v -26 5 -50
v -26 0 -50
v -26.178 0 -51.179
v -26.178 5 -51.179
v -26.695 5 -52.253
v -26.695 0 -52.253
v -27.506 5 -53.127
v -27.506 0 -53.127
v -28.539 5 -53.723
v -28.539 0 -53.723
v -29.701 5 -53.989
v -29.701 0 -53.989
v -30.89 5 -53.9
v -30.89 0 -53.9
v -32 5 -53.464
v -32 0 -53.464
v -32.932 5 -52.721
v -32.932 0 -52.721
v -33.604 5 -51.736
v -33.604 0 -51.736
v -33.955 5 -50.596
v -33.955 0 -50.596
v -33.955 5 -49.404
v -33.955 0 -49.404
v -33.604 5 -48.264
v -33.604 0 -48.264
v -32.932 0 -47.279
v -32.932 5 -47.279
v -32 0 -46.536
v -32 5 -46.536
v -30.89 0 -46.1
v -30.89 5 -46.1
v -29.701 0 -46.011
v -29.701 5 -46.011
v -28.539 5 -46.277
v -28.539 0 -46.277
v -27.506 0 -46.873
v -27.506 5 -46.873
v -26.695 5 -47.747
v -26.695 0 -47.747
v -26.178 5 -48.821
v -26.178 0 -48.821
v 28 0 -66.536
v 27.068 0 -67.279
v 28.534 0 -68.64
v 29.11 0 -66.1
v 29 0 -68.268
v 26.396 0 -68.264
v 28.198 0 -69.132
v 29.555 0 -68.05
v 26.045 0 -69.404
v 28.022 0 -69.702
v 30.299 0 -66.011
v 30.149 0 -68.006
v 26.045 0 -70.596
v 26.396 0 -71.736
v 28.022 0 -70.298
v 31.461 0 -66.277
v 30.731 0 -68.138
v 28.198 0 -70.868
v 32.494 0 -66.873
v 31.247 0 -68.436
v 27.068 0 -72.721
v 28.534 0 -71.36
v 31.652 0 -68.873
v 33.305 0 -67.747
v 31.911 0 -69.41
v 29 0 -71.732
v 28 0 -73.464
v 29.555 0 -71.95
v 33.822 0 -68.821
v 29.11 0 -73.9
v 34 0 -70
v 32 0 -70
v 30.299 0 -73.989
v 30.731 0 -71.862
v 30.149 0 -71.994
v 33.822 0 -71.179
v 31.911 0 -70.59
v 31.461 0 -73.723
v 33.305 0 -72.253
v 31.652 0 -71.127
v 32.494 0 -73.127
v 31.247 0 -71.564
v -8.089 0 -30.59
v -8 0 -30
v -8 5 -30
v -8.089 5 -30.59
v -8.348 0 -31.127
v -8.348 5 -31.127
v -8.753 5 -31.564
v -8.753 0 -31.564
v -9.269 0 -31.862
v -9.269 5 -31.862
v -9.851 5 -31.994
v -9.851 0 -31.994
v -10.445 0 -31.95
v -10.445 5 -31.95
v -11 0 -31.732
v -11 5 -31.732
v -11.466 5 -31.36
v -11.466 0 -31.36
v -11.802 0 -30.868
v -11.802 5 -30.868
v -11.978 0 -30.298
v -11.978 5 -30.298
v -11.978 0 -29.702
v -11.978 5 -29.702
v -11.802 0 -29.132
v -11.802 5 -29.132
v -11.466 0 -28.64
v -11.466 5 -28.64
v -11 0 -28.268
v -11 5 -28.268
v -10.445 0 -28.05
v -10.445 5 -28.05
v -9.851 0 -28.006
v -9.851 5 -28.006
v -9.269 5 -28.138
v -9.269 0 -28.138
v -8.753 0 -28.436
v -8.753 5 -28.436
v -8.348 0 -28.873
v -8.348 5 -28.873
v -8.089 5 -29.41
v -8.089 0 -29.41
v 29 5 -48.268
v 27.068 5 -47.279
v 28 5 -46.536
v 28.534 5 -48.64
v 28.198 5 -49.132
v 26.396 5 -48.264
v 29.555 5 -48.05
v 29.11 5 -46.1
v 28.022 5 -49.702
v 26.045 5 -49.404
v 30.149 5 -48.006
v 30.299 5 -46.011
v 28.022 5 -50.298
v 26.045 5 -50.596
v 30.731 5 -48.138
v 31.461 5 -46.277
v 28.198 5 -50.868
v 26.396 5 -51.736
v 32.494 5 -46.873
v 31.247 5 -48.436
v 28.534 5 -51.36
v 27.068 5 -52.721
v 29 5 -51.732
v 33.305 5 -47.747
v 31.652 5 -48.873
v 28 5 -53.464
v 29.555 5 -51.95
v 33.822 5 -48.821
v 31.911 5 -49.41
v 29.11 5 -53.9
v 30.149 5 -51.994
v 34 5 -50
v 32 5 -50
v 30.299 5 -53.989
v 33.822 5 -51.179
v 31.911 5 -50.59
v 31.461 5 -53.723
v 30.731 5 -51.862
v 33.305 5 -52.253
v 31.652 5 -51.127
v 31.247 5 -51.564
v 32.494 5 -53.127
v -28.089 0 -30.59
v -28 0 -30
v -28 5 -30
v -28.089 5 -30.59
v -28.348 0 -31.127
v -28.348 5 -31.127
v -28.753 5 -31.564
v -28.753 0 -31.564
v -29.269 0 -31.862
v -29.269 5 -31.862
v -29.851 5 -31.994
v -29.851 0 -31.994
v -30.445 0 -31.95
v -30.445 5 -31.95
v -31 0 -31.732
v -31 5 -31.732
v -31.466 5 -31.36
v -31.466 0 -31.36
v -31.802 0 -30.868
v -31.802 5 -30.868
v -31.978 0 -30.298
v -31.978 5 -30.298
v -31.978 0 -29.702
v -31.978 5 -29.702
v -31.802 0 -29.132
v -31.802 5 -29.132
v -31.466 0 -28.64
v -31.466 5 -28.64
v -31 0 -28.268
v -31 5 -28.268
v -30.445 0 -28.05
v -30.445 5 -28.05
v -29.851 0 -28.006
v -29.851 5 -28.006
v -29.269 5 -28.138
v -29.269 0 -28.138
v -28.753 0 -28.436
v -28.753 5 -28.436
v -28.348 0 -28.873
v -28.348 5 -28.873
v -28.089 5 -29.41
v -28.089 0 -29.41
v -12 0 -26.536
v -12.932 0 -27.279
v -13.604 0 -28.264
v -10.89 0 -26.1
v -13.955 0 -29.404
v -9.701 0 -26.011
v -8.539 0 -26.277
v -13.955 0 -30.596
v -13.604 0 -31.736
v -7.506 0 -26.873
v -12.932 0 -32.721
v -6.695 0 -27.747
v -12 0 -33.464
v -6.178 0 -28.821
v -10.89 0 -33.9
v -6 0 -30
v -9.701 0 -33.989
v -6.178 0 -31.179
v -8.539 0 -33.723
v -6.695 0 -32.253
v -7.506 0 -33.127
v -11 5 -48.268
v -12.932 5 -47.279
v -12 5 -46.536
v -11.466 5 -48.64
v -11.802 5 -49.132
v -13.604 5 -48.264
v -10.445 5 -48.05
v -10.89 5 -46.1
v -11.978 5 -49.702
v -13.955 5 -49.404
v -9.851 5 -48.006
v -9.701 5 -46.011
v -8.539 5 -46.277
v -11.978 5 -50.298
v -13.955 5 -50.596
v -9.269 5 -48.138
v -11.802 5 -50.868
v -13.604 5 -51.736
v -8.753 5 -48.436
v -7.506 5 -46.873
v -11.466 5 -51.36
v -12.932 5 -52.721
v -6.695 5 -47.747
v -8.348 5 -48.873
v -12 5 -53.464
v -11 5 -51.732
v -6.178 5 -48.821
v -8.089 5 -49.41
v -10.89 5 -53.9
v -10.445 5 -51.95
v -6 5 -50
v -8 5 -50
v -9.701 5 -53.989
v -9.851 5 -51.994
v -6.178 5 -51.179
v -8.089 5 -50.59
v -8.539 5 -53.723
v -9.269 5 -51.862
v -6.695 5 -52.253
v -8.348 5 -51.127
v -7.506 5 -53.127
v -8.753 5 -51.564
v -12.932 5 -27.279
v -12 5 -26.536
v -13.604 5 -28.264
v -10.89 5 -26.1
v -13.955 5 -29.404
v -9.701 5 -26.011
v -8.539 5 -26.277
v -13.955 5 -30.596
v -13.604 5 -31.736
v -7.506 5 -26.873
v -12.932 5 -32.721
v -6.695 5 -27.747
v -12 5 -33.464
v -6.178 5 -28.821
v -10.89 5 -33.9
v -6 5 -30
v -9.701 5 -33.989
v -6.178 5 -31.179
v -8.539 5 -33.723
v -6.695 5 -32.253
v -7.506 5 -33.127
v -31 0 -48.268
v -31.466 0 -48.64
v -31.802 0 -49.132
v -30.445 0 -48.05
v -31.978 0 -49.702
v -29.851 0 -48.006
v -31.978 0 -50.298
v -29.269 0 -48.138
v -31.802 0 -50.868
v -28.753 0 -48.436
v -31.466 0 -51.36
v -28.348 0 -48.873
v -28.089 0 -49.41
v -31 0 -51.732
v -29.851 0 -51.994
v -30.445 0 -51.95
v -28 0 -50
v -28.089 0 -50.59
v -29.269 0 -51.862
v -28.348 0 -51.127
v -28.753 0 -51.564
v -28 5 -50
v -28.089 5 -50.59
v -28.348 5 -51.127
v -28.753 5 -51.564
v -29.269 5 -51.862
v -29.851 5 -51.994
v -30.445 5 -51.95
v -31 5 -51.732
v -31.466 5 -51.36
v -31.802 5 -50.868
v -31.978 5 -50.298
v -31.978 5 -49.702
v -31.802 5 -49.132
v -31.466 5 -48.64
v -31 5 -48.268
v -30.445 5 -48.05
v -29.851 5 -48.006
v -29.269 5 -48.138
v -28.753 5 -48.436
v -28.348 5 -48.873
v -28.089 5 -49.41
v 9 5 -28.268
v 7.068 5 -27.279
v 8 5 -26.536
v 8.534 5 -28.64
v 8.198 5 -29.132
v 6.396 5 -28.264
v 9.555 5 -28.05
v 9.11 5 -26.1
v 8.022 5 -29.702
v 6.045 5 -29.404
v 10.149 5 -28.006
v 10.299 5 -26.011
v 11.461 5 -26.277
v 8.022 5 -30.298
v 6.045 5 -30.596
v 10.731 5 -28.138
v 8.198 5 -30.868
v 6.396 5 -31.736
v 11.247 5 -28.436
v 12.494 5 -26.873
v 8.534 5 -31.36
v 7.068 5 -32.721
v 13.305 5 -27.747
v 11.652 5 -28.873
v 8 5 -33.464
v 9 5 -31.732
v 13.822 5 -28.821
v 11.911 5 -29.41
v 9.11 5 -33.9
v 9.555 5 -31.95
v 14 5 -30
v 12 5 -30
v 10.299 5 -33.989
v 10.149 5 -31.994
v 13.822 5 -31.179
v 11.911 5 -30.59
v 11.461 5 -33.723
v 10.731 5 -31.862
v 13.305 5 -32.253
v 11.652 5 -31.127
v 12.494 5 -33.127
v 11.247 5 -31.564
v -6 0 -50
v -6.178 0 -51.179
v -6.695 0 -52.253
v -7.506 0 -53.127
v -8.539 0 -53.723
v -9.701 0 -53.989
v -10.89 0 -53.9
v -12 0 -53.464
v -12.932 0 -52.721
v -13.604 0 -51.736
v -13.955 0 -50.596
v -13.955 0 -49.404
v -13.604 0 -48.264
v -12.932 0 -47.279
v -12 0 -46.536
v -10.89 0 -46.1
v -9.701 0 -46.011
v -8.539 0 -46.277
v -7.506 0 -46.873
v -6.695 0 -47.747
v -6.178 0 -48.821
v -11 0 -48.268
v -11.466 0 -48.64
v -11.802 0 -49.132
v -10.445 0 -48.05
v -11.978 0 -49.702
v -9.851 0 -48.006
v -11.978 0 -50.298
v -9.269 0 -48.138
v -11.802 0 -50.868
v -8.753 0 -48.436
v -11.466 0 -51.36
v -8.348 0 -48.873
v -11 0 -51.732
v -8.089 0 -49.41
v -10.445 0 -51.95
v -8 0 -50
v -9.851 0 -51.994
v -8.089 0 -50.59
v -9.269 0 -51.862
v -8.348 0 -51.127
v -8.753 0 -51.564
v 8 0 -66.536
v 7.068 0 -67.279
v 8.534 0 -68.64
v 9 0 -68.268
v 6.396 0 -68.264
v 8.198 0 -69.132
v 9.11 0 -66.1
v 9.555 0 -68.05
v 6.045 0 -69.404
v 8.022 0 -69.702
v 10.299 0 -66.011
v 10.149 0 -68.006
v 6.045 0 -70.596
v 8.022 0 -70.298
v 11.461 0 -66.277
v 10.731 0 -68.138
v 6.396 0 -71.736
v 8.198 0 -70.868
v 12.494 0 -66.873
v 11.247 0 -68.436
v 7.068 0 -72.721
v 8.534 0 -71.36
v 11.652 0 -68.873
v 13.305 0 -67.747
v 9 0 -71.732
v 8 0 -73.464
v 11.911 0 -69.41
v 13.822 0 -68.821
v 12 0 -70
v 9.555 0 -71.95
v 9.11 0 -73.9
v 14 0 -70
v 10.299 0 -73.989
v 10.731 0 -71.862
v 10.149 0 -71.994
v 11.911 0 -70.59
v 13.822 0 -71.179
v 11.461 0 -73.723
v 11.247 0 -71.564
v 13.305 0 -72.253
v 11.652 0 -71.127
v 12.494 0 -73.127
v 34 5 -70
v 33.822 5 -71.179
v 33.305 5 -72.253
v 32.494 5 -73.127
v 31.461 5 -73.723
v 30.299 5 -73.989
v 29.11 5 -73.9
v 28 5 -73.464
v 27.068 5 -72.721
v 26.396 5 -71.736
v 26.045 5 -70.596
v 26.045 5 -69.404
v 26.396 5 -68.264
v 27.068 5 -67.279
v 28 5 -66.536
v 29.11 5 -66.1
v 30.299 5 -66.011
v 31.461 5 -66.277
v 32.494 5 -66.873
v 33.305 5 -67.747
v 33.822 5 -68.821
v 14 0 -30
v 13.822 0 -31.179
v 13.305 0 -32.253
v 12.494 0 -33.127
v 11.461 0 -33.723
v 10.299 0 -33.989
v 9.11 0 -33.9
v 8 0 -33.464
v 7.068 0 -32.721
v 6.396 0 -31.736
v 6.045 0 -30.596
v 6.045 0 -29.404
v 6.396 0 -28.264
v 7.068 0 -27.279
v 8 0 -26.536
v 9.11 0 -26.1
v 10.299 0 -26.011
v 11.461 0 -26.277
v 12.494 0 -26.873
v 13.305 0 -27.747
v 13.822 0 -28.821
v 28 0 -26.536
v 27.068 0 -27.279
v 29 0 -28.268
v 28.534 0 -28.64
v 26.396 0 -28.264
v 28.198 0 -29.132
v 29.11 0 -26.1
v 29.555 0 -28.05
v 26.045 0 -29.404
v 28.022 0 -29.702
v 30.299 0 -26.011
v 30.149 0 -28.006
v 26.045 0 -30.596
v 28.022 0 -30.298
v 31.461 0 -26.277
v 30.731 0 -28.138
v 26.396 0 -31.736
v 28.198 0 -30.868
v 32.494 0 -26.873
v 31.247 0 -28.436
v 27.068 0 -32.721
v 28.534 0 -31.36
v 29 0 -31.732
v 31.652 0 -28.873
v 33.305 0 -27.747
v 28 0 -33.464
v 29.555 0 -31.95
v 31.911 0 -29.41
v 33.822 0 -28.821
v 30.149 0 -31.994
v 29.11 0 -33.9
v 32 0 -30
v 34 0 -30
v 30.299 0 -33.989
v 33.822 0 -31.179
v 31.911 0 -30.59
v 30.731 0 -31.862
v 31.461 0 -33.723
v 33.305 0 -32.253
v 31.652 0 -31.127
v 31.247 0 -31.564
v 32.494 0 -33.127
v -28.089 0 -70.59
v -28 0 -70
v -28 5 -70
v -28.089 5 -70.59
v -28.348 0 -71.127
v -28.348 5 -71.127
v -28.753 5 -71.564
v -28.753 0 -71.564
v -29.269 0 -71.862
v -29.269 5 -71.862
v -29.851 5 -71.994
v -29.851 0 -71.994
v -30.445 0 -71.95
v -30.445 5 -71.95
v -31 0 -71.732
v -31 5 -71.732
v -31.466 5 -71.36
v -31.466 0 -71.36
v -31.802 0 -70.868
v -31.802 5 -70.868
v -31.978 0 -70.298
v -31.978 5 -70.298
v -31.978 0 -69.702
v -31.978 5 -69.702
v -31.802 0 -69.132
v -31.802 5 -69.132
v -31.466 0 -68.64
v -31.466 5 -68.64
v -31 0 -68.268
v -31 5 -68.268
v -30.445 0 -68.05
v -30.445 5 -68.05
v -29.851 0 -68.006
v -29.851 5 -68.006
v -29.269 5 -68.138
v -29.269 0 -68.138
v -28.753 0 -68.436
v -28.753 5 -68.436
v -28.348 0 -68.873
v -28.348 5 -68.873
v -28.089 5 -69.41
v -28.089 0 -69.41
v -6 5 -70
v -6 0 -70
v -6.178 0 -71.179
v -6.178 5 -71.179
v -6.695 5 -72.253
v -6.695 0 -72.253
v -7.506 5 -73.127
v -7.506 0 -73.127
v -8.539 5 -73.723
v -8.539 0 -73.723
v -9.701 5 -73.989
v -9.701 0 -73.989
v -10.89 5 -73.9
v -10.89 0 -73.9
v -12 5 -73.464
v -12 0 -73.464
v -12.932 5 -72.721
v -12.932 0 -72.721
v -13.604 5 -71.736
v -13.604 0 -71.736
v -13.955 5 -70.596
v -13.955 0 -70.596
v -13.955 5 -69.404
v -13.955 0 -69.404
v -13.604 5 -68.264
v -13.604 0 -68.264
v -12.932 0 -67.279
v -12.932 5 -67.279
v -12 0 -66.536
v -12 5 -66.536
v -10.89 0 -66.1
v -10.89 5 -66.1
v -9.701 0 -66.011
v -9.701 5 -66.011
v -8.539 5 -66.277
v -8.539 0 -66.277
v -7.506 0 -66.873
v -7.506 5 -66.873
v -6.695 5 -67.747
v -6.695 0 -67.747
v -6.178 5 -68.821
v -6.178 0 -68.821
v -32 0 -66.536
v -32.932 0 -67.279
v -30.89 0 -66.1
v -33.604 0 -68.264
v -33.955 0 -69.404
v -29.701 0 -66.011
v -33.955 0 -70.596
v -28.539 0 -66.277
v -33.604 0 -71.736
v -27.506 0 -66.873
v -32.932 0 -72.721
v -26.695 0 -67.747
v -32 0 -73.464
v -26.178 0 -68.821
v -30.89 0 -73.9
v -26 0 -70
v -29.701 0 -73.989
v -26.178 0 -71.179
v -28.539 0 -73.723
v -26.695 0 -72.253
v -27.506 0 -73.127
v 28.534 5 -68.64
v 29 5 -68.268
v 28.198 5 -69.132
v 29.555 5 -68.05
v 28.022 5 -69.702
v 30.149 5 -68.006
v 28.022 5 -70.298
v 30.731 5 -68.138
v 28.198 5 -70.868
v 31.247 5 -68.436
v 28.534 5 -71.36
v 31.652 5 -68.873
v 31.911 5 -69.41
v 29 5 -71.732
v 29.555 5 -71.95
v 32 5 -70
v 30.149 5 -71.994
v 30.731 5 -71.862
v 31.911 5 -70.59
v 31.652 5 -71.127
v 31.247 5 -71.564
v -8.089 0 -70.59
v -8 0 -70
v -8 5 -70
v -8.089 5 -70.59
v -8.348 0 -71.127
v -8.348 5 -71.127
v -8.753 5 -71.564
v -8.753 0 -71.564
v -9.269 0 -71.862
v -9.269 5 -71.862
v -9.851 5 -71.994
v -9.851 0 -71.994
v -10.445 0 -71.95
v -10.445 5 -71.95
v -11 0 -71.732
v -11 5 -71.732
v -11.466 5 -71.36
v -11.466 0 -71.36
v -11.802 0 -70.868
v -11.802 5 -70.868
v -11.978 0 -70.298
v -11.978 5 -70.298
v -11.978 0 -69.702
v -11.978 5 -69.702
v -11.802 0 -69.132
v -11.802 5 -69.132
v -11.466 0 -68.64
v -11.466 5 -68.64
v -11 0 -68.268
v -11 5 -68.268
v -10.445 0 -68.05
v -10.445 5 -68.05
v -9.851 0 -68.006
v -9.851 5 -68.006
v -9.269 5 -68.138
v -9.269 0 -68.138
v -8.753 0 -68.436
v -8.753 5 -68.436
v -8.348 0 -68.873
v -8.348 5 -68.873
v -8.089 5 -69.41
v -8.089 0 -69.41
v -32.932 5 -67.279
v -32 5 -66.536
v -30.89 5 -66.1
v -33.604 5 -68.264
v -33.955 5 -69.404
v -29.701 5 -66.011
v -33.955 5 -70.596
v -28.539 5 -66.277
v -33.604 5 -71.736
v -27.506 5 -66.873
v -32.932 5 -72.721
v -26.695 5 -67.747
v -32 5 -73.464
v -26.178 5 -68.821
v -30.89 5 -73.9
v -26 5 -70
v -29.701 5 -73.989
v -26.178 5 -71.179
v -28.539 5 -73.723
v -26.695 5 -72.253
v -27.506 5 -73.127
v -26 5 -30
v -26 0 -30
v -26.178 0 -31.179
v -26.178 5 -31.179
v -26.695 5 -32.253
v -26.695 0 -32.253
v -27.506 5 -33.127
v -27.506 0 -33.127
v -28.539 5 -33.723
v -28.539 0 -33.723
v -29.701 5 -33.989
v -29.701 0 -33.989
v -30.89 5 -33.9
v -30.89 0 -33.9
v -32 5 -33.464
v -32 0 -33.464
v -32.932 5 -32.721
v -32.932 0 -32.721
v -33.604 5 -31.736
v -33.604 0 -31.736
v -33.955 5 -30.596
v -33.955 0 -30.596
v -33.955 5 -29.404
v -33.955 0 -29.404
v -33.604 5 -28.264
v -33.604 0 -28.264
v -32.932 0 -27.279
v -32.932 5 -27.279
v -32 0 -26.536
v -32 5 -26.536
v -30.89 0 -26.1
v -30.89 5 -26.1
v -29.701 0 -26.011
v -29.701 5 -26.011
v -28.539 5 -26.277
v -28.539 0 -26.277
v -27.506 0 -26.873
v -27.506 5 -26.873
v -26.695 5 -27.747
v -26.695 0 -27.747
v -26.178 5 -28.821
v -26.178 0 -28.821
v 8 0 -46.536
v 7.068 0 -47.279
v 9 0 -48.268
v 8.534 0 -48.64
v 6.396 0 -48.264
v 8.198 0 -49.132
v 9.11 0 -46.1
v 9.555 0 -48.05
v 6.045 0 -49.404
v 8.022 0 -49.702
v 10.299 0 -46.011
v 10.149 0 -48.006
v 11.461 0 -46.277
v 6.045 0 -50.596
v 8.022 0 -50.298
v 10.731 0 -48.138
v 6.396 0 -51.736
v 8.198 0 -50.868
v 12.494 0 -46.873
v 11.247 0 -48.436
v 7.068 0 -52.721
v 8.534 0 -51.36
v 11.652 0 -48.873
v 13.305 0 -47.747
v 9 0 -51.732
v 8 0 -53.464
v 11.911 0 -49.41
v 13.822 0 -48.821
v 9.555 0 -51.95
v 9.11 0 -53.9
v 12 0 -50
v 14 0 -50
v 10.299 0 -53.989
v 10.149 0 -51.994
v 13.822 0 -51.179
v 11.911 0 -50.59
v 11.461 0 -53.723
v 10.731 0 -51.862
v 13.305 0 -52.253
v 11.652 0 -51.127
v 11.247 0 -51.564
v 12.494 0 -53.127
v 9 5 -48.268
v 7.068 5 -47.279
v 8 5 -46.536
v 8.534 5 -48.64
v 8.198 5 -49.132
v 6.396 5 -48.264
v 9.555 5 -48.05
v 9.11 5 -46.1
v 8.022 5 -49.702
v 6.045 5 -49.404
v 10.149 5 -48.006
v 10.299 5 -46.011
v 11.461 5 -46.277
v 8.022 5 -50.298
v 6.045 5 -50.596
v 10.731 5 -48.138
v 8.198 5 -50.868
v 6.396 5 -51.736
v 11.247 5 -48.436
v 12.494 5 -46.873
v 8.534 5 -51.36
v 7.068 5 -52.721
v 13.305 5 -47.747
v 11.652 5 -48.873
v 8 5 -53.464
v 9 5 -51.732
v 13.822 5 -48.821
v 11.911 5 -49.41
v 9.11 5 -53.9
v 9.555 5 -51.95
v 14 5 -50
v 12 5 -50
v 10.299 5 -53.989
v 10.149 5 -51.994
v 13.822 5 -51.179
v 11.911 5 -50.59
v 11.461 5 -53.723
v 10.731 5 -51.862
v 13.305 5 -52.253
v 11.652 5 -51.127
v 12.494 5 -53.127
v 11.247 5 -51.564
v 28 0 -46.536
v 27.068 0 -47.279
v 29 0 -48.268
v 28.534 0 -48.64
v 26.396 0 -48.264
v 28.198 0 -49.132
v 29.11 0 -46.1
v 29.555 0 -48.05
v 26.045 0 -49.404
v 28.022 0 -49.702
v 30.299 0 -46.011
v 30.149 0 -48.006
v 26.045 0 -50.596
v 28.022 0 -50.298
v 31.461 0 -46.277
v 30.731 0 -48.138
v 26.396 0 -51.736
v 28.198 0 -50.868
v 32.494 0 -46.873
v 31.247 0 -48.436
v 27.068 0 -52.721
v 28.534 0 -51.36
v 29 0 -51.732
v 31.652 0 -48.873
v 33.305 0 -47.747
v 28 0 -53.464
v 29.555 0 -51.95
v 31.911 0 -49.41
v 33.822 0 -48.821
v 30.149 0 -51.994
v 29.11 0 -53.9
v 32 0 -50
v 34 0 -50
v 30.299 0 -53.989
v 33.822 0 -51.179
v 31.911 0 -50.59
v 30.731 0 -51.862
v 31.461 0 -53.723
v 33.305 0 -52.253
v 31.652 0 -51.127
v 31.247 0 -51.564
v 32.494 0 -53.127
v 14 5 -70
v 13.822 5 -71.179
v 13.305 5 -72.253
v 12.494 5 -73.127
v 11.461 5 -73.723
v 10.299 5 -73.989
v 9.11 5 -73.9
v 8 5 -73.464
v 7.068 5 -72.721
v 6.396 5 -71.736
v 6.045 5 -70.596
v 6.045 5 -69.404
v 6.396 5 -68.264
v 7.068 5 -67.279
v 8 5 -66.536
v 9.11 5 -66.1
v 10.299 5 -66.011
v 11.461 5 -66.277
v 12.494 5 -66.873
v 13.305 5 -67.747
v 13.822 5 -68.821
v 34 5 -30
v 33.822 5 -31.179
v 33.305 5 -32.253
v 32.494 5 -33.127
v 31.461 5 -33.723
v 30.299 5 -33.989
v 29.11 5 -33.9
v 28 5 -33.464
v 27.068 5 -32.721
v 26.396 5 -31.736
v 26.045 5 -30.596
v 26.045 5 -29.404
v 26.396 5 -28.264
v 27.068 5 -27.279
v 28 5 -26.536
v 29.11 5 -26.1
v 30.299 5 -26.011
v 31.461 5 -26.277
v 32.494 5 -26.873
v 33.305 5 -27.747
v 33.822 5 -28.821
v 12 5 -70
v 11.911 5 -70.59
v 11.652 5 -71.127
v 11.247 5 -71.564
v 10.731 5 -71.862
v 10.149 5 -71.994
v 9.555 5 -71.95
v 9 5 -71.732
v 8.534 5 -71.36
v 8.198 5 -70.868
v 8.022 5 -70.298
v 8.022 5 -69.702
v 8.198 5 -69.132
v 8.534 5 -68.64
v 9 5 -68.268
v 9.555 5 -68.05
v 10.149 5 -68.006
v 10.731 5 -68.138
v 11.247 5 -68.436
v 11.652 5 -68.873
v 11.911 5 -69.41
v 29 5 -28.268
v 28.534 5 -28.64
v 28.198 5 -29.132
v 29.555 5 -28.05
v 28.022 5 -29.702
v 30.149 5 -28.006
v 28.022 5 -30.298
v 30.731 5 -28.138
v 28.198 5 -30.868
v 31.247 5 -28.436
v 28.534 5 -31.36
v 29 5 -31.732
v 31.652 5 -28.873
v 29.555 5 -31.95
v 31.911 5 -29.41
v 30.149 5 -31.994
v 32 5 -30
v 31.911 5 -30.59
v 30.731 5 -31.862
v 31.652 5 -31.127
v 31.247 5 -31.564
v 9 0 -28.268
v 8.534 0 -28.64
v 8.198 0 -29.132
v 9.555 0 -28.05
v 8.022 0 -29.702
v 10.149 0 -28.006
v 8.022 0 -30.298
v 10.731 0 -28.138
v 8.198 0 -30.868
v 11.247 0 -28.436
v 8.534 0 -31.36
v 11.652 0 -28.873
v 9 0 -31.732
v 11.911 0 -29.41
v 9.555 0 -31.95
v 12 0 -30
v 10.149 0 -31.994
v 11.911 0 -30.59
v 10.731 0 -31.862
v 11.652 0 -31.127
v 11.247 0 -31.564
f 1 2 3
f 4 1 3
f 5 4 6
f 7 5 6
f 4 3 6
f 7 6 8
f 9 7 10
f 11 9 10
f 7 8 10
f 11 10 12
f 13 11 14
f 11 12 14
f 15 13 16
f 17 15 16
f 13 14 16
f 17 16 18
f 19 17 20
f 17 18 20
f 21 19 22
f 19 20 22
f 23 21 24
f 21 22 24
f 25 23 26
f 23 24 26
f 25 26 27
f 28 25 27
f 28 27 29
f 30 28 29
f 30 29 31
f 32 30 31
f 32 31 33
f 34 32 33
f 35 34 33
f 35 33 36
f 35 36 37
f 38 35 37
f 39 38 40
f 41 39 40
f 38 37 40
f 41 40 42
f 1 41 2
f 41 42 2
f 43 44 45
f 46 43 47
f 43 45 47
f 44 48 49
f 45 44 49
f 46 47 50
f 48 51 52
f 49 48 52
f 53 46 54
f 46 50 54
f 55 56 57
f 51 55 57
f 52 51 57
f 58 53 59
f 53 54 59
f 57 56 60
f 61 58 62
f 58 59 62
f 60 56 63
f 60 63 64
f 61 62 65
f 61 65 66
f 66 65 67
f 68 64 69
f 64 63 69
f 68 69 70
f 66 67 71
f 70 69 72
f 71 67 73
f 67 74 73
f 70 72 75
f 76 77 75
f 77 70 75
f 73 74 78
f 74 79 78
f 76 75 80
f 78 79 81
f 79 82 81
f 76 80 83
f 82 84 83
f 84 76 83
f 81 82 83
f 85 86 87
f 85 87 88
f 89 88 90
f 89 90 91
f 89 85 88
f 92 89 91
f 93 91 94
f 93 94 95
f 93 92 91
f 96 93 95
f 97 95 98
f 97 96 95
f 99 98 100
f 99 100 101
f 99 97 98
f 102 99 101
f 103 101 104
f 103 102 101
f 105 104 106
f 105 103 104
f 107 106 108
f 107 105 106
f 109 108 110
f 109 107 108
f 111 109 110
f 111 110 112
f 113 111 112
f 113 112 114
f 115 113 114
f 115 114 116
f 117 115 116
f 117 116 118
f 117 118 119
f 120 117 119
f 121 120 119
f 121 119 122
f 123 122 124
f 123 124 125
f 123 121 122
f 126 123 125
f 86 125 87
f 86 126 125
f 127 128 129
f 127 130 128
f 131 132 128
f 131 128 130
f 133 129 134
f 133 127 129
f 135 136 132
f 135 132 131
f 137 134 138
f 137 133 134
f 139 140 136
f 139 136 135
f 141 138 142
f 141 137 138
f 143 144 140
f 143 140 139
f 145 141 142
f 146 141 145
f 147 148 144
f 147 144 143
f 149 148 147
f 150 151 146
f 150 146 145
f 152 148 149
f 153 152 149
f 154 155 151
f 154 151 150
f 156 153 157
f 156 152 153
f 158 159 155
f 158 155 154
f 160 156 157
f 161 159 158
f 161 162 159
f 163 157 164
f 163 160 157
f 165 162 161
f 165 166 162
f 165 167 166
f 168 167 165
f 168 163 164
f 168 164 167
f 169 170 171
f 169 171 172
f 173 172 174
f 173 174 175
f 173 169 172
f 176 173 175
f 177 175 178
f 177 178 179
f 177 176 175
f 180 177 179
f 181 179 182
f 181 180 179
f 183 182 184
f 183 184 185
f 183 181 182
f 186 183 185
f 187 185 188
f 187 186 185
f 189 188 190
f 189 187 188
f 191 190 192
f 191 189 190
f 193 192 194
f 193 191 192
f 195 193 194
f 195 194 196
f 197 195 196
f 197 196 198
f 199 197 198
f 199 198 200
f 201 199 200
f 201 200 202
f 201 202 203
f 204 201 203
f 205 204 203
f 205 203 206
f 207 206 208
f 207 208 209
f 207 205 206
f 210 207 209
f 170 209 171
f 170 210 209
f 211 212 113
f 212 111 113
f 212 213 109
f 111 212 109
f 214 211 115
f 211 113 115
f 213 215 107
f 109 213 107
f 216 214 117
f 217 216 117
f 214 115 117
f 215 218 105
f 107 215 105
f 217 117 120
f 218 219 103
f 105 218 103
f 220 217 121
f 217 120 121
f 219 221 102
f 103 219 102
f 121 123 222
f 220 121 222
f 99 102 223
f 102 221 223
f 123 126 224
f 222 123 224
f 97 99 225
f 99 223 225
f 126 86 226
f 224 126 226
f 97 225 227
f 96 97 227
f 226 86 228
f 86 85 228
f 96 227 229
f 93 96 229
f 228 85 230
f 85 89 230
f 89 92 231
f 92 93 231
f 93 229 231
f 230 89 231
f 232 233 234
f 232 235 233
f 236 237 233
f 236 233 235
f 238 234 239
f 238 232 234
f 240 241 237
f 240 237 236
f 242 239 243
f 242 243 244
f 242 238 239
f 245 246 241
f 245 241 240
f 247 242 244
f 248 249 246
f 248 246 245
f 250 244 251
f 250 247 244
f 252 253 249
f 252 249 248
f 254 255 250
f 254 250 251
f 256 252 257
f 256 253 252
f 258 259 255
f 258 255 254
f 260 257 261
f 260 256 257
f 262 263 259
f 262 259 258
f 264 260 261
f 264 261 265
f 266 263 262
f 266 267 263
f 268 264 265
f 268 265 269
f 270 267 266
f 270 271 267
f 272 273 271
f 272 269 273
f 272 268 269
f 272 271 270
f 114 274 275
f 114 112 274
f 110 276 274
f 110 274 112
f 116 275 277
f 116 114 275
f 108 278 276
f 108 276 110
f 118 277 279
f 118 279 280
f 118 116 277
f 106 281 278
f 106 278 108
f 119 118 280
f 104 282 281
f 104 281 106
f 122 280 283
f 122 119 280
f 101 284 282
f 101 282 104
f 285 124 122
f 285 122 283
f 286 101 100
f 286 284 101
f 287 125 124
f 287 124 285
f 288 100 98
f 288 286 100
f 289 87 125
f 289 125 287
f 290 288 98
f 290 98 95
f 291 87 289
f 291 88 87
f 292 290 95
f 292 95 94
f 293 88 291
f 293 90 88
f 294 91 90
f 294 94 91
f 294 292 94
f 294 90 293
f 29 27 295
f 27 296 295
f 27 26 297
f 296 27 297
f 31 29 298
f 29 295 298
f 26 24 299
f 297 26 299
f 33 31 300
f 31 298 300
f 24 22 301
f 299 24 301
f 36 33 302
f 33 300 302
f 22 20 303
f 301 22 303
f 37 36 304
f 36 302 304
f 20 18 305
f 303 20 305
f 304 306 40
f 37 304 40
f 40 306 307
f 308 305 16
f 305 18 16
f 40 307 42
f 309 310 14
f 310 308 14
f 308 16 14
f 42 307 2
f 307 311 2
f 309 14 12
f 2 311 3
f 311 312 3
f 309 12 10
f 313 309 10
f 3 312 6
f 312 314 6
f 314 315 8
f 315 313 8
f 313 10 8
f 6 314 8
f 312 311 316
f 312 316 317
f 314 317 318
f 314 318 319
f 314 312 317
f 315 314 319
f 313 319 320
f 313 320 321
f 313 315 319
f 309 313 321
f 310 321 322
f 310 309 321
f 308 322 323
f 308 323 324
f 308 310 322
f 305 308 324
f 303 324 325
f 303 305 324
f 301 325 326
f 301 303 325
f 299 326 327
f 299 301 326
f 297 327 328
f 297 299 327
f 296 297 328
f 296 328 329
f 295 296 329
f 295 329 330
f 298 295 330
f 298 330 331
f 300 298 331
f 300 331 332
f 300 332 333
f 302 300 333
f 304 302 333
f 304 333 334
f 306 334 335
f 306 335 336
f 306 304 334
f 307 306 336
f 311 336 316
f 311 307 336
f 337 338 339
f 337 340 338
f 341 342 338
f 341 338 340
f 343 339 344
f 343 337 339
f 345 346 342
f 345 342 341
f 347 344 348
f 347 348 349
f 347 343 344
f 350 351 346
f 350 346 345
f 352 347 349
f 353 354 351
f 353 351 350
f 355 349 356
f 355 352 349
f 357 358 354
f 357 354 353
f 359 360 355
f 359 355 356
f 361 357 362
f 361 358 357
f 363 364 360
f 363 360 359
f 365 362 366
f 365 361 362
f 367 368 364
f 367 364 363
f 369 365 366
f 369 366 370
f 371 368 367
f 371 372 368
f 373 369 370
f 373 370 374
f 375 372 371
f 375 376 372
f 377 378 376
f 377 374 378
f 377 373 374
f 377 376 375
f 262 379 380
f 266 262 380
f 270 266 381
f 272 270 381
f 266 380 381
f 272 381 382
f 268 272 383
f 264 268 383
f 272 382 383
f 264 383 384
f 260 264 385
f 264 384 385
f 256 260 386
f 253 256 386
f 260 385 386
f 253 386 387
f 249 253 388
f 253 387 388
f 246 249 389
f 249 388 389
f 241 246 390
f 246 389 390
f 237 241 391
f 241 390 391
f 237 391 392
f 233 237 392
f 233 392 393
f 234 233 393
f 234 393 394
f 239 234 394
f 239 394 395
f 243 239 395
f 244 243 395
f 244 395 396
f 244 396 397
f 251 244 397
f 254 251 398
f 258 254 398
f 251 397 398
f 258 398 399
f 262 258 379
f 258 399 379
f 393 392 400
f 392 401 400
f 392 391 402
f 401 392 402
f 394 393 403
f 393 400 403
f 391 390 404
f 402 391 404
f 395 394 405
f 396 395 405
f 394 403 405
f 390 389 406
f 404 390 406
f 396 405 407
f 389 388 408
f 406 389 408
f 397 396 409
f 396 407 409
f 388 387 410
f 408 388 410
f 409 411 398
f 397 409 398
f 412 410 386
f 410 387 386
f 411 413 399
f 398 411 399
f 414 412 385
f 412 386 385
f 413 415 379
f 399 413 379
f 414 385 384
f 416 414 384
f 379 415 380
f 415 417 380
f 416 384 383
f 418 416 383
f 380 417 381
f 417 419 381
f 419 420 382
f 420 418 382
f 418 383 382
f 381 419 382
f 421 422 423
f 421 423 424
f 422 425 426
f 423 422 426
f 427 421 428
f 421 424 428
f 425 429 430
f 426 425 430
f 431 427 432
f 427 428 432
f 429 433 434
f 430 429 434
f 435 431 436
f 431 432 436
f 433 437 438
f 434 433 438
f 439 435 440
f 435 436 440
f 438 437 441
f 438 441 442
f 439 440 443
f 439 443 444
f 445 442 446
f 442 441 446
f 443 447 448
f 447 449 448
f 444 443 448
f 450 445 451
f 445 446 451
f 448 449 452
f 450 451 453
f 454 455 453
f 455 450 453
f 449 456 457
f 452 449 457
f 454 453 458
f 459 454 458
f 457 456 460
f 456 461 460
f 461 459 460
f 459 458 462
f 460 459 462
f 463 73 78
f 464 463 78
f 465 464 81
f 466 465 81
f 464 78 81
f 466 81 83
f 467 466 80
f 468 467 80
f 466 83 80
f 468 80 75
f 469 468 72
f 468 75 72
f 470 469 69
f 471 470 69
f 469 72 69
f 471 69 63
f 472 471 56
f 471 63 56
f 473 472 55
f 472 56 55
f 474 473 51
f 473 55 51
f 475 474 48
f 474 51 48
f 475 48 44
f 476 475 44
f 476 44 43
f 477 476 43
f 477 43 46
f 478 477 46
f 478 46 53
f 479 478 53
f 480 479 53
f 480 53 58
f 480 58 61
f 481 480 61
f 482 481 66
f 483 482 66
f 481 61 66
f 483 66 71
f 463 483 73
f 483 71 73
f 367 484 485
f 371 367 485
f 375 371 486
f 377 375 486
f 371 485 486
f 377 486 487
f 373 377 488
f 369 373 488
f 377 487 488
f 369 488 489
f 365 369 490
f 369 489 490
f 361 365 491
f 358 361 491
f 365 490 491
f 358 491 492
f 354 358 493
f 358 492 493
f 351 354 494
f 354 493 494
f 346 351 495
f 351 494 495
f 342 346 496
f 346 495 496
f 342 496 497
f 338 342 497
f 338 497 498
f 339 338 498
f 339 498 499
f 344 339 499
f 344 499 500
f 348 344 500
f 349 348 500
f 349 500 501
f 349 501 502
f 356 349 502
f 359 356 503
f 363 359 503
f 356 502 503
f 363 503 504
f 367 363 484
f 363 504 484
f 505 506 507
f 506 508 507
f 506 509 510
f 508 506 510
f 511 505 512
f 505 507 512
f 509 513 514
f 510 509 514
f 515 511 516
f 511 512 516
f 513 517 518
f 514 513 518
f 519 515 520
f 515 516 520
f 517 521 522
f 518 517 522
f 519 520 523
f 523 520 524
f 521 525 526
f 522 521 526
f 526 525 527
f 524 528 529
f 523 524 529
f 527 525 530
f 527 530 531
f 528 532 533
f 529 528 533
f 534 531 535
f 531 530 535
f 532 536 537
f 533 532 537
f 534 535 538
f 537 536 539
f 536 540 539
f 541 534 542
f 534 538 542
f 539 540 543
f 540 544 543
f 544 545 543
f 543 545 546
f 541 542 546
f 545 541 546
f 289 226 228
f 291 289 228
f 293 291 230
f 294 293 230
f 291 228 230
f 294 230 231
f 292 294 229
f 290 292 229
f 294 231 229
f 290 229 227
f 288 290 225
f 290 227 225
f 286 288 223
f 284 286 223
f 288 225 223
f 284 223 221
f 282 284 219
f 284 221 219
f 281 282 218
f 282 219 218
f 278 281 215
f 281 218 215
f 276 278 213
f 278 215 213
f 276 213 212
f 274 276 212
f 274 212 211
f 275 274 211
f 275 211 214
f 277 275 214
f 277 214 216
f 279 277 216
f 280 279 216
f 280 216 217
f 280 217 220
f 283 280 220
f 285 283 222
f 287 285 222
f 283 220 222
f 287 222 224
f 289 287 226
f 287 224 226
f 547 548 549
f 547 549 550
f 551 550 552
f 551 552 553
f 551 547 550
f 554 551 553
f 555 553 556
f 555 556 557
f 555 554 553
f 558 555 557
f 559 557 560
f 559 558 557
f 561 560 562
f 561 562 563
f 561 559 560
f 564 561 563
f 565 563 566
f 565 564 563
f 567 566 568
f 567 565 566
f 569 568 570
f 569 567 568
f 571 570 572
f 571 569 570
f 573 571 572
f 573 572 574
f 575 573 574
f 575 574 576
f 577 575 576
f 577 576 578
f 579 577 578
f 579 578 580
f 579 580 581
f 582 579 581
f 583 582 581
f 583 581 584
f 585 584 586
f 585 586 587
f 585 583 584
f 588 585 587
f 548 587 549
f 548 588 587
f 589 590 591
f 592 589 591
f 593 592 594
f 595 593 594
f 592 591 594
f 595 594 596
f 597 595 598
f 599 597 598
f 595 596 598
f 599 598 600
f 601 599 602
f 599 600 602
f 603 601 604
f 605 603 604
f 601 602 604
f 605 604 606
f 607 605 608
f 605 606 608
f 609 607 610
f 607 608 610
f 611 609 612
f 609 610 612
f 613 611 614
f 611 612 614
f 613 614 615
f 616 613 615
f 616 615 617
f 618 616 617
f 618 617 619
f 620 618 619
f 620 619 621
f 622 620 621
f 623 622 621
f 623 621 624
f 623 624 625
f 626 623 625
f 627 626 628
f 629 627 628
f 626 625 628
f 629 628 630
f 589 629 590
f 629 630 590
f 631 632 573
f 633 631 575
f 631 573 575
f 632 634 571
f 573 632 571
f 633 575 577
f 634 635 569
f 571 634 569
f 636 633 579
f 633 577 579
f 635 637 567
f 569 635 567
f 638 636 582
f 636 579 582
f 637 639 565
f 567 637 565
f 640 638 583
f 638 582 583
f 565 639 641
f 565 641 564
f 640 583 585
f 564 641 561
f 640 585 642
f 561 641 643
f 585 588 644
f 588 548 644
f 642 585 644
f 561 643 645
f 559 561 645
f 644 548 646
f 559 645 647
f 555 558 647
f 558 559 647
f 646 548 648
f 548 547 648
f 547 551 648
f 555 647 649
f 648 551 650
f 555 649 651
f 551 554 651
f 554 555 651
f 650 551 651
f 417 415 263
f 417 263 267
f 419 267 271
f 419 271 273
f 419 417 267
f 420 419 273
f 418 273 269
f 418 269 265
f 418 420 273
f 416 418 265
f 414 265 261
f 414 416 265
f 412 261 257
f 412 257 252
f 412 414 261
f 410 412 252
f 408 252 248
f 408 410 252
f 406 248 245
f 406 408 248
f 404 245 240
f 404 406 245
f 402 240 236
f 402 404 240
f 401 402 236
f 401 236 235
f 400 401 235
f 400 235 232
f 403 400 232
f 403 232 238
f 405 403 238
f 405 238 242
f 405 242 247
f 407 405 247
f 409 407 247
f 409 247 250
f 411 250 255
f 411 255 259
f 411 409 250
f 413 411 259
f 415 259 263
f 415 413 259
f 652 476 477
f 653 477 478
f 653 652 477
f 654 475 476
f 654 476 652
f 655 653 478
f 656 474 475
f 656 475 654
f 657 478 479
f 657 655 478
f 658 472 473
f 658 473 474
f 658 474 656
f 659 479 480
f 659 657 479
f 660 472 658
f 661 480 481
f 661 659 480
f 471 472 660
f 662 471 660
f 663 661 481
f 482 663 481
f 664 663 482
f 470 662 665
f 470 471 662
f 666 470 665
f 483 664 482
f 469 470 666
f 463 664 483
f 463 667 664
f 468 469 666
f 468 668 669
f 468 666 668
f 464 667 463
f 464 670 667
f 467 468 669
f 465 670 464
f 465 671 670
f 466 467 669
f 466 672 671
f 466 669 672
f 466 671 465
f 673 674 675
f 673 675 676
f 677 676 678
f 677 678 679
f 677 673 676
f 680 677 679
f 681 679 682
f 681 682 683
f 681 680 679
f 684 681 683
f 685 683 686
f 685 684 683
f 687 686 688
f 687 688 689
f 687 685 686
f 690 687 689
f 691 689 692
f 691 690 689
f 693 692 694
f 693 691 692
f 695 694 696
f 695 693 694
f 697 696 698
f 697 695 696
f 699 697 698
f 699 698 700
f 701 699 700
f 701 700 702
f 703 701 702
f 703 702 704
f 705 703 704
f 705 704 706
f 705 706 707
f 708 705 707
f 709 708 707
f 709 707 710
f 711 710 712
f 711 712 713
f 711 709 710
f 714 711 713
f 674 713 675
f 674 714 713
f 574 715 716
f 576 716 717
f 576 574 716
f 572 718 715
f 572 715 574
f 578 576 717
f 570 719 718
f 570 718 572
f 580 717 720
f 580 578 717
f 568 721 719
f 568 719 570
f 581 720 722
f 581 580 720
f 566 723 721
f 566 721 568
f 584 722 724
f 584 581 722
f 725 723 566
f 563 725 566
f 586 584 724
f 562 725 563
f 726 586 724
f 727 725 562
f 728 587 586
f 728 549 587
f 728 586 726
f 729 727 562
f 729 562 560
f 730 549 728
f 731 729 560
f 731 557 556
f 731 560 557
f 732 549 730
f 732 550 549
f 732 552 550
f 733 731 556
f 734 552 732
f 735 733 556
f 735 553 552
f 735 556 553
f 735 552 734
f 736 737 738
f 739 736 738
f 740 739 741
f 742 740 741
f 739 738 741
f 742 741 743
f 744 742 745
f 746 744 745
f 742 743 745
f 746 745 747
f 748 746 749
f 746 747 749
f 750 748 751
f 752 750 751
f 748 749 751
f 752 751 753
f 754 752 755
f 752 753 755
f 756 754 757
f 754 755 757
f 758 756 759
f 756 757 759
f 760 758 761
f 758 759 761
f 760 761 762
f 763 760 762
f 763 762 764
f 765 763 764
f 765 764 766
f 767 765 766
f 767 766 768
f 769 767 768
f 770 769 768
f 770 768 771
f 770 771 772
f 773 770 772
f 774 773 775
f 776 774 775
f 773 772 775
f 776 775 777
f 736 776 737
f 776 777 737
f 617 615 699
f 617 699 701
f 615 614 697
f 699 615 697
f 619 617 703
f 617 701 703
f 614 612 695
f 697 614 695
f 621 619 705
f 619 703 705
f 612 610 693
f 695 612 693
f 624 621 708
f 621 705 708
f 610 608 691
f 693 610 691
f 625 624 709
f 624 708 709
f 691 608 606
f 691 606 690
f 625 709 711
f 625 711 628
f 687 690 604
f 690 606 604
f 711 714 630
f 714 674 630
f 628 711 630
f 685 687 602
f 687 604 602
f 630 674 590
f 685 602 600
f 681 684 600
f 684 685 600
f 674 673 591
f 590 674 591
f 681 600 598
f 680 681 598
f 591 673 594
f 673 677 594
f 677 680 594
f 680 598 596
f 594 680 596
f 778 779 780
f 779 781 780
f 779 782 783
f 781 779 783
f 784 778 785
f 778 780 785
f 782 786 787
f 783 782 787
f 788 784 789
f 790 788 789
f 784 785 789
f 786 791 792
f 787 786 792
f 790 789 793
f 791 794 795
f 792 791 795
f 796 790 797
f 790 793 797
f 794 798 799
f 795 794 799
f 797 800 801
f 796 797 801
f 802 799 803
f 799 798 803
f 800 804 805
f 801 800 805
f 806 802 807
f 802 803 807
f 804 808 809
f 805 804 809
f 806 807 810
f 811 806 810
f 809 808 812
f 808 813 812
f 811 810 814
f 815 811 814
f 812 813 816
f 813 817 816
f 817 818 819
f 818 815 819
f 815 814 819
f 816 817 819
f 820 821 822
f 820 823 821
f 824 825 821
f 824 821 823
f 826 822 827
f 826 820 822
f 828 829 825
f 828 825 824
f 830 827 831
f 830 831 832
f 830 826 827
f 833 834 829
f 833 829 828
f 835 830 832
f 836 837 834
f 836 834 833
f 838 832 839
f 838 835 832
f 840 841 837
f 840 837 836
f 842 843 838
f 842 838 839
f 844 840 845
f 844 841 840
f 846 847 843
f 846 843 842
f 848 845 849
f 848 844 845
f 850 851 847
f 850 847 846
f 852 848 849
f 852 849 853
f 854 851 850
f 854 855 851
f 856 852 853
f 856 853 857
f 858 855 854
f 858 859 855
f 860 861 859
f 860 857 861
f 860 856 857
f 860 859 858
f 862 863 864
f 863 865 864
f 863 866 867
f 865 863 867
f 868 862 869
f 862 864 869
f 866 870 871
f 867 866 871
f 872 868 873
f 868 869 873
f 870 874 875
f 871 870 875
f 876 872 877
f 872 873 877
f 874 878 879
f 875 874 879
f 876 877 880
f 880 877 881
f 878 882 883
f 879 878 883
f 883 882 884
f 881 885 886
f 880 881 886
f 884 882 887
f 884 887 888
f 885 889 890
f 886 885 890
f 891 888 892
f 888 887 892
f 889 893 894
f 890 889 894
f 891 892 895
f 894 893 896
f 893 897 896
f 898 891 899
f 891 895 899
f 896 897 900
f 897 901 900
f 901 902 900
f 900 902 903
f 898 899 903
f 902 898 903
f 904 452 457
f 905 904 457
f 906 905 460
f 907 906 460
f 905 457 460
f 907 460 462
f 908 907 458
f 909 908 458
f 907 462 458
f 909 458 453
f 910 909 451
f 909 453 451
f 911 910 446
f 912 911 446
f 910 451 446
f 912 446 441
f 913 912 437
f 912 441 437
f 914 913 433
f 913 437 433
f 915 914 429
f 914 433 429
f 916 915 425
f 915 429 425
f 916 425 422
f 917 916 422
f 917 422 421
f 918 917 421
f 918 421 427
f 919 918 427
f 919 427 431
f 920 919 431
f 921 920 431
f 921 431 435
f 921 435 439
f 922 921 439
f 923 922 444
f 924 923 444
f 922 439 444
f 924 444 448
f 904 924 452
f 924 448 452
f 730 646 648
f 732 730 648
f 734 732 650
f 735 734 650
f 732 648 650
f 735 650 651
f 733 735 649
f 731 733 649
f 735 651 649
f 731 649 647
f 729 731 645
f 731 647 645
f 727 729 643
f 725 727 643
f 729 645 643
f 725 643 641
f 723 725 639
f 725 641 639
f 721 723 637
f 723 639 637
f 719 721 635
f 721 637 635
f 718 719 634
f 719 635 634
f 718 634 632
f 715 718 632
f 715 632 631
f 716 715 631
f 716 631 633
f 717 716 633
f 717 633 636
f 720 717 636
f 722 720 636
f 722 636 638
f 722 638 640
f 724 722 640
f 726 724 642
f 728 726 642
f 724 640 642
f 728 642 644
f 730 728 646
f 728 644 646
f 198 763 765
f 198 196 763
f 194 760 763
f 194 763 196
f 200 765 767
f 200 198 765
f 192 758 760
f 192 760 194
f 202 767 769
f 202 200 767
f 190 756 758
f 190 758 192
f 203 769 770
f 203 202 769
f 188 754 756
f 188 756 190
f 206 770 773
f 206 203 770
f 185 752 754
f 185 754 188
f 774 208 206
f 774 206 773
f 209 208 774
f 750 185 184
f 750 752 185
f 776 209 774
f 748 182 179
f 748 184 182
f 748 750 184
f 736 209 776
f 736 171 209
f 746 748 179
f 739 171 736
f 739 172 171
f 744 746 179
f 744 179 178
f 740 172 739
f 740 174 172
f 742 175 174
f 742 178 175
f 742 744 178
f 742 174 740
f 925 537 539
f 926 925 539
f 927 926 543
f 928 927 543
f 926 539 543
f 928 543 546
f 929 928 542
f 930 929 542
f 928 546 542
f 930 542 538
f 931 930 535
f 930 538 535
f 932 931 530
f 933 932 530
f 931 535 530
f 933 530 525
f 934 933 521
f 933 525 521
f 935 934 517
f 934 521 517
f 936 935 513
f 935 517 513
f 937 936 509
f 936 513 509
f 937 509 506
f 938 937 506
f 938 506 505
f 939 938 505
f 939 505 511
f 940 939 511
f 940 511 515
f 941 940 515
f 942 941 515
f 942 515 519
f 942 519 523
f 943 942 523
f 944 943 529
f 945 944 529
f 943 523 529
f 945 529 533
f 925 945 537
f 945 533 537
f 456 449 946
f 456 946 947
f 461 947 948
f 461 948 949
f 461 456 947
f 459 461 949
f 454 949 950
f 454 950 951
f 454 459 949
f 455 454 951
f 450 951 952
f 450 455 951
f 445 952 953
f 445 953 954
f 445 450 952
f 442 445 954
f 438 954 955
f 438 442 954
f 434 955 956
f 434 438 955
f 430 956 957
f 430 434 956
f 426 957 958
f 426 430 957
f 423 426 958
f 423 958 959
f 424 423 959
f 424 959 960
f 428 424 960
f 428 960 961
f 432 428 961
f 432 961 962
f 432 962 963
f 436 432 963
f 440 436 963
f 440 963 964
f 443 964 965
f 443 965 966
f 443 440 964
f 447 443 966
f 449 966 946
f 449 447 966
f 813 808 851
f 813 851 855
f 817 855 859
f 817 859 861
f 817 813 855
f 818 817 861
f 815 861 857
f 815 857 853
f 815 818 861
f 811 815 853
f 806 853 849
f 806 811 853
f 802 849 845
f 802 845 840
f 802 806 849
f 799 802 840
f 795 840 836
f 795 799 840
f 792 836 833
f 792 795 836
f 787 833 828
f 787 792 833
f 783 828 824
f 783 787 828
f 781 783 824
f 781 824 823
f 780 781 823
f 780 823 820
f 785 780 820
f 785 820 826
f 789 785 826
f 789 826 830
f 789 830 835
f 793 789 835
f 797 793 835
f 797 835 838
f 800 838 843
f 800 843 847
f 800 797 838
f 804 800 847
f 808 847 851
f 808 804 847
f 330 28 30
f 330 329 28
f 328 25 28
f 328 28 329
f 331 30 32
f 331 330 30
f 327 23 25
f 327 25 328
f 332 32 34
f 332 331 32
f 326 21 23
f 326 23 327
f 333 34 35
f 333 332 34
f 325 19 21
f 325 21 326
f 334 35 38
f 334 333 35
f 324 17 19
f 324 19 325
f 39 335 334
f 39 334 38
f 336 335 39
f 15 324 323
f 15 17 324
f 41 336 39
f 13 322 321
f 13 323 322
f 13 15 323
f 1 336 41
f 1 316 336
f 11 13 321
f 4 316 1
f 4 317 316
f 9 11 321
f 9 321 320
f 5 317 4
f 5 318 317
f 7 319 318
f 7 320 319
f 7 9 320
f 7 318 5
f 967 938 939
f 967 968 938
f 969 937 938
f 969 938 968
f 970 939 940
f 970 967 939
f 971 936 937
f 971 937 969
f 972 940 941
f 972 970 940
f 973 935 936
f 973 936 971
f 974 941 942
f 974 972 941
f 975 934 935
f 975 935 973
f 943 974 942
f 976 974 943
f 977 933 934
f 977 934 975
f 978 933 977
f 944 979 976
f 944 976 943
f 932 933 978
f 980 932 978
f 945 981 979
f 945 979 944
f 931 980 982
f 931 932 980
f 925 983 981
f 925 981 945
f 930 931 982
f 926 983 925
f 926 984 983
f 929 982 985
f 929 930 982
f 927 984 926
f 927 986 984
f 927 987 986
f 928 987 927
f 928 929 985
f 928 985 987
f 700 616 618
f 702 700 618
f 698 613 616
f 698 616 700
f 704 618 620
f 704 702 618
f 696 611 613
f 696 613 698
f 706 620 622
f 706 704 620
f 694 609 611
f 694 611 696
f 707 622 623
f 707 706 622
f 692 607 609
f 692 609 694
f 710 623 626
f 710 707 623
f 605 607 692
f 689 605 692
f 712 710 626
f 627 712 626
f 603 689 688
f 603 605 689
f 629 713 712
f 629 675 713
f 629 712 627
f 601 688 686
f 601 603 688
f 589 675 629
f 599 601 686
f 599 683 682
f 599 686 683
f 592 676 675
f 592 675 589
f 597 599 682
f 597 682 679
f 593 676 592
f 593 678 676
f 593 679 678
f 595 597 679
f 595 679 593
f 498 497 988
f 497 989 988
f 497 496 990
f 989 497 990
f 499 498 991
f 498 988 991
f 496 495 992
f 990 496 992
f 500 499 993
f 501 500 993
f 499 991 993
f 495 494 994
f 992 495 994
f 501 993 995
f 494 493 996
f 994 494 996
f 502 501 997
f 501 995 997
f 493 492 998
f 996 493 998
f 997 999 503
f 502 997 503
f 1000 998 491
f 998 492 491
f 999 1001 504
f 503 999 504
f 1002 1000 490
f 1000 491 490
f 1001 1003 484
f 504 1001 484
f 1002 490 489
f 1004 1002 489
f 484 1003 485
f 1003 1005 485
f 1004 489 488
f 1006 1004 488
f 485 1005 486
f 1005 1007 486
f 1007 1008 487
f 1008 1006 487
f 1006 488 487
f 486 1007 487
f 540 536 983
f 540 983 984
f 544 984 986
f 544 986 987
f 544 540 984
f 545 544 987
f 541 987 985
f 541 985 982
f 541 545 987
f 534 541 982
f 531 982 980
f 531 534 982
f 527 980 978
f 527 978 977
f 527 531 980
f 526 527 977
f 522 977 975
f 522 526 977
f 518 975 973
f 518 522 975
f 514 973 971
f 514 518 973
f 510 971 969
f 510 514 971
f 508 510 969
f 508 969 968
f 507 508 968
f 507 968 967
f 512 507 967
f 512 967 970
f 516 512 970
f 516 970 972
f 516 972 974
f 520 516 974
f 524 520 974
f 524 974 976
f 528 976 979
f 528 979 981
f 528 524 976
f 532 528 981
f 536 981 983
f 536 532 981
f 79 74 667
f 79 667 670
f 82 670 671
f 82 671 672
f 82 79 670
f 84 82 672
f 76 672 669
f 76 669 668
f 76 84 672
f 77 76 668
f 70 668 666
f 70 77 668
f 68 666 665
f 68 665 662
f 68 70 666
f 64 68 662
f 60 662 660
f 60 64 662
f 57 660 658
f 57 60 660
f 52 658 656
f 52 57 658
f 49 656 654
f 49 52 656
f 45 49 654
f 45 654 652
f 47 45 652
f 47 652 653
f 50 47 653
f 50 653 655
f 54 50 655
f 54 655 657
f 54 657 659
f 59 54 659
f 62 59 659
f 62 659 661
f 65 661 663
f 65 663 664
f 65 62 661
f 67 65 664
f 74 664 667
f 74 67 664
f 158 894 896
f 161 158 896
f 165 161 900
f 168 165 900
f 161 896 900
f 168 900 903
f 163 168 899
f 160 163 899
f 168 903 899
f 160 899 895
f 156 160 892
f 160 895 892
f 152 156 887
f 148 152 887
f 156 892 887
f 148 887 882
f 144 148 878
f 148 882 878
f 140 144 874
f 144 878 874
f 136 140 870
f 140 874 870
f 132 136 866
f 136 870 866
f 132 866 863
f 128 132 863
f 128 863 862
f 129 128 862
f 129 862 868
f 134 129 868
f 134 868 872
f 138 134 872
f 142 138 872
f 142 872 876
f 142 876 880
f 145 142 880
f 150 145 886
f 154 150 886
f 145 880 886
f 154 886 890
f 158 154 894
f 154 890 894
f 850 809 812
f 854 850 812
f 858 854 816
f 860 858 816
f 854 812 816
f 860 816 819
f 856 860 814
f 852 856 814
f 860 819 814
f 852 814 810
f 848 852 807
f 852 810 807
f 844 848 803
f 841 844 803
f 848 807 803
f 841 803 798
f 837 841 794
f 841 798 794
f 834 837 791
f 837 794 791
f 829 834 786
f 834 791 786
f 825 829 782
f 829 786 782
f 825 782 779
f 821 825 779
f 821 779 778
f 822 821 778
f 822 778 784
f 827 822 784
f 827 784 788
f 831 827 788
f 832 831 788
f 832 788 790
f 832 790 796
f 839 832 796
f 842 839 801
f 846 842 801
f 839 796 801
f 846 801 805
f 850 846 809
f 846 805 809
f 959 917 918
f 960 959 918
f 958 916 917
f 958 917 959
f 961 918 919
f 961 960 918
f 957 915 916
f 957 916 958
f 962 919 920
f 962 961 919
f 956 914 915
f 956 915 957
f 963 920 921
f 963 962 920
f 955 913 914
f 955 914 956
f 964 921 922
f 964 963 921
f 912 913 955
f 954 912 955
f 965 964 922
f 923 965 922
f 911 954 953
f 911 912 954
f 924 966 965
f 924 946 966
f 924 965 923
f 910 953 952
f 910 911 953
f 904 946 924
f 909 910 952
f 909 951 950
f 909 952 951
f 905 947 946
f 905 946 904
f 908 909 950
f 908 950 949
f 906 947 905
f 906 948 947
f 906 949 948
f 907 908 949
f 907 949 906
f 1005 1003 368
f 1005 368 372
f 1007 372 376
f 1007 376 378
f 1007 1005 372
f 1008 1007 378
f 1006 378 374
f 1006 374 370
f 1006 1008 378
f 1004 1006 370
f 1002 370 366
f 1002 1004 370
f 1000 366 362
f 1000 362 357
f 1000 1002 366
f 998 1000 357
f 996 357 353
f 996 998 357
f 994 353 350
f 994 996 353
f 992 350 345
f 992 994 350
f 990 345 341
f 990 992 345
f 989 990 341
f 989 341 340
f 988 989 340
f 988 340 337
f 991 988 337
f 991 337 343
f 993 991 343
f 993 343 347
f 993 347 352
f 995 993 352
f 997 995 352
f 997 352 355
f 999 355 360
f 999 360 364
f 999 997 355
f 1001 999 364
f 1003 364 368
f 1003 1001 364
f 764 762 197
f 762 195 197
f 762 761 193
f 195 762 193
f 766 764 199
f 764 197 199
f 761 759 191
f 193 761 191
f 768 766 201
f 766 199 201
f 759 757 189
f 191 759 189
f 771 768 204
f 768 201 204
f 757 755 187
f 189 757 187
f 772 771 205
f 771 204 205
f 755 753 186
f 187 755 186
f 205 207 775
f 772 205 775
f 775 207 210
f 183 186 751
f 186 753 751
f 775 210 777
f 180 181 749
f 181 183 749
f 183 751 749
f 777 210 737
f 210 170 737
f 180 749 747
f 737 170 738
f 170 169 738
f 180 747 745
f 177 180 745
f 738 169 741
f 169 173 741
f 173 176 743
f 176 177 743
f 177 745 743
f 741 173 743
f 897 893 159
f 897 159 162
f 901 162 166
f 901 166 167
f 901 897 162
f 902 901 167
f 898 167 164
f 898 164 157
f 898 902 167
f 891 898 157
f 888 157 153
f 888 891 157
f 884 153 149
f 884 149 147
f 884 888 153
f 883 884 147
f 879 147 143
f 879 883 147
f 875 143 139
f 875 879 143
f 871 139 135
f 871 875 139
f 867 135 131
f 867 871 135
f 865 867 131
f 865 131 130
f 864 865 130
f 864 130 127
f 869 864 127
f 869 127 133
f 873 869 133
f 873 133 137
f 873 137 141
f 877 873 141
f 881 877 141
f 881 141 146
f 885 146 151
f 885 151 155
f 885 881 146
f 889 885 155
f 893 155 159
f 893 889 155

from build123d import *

# Parameters (mm, degrees)
SKETCH1_R              = 4
SKETCH1_R_2            = 2
BOSS_EXTRUDE1_DEPTH    = 5
BOSS_EXTRUDE1_2_DEPTH  = 5
BOSS_EXTRUDE1_3_DEPTH  = 5
BOSS_EXTRUDE1_4_DEPTH  = 5
BOSS_EXTRUDE1_5_DEPTH  = 5
BOSS_EXTRUDE1_6_DEPTH  = 5
BOSS_EXTRUDE1_7_DEPTH  = 5
BOSS_EXTRUDE1_8_DEPTH  = 5
BOSS_EXTRUDE1_9_DEPTH  = 5
BOSS_EXTRUDE1_10_DEPTH = 5
BOSS_EXTRUDE1_11_DEPTH = 5
BOSS_EXTRUDE1_12_DEPTH = 5


with BuildPart() as part:
    # Sketch1 → Boss-Extrude1 (new body)
    with BuildSketch(Plane(origin=(0, 0, 0), x_dir=(1, 0, 0), z_dir=(0, 1, 0))):
        with Locations((-30, 30)):
            Circle(SKETCH1_R)
        with Locations((-30, 30)):
            Circle(SKETCH1_R_2, mode=Mode.SUBTRACT)
    extrude(amount=BOSS_EXTRUDE1_DEPTH)


with BuildPart() as body_2:
    # Sketch1 → Boss-Extrude1 2 (new body)
    with BuildSketch(Plane(origin=(0, 0, 0), x_dir=(1, 0, 0), z_dir=(0, 1, 0))):
        with Locations((-10, 30)):
            Circle(SKETCH1_R)
        with Locations((-10, 30)):
            Circle(SKETCH1_R_2, mode=Mode.SUBTRACT)
    extrude(amount=BOSS_EXTRUDE1_2_DEPTH)


with BuildPart() as body_3:
    # Sketch1 → Boss-Extrude1 3 (new body)
    with BuildSketch(Plane(origin=(0, 0, 0), x_dir=(1, 0, 0), z_dir=(0, 1, 0))):
        with Locations((10, 30)):
            Circle(SKETCH1_R)
        with Locations((10, 30)):
            Circle(SKETCH1_R_2, mode=Mode.SUBTRACT)
    extrude(amount=BOSS_EXTRUDE1_3_DEPTH)


with BuildPart() as body_4:
    # Sketch1 → Boss-Extrude1 4 (new body)
    with BuildSketch(Plane(origin=(0, 0, 0), x_dir=(1, 0, 0), z_dir=(0, 1, 0))):
        with Locations((30, 30)):
            Circle(SKETCH1_R)
        with Locations((30, 30)):
            Circle(SKETCH1_R_2, mode=Mode.SUBTRACT)
    extrude(amount=BOSS_EXTRUDE1_4_DEPTH)


with BuildPart() as body_5:
    # Sketch1 → Boss-Extrude1 5 (new body)
    with BuildSketch(Plane(origin=(0, 0, 0), x_dir=(1, 0, 0), z_dir=(0, 1, 0))):
        with Locations((-10, 50)):
            Circle(SKETCH1_R)
        with Locations((-10, 50)):
            Circle(SKETCH1_R_2, mode=Mode.SUBTRACT)
    extrude(amount=BOSS_EXTRUDE1_5_DEPTH)


with BuildPart() as body_6:
    # Sketch1 → Boss-Extrude1 6 (new body)
    with BuildSketch(Plane(origin=(0, 0, 0), x_dir=(1, 0, 0), z_dir=(0, 1, 0))):
        with Locations((10, 50)):
            Circle(SKETCH1_R)
        with Locations((10, 50)):
            Circle(SKETCH1_R_2, mode=Mode.SUBTRACT)
    extrude(amount=BOSS_EXTRUDE1_6_DEPTH)


with BuildPart() as body_7:
    # Sketch1 → Boss-Extrude1 7 (new body)
    with BuildSketch(Plane(origin=(0, 0, 0), x_dir=(1, 0, 0), z_dir=(0, 1, 0))):
        with Locations((30, 50)):
            Circle(SKETCH1_R)
        with Locations((30, 50)):
            Circle(SKETCH1_R_2, mode=Mode.SUBTRACT)
    extrude(amount=BOSS_EXTRUDE1_7_DEPTH)


with BuildPart() as body_8:
    # Sketch1 → Boss-Extrude1 8 (new body)
    with BuildSketch(Plane(origin=(0, 0, 0), x_dir=(1, 0, 0), z_dir=(0, 1, 0))):
        with Locations((-10, 70)):
            Circle(SKETCH1_R)
        with Locations((-10, 70)):
            Circle(SKETCH1_R_2, mode=Mode.SUBTRACT)
    extrude(amount=BOSS_EXTRUDE1_8_DEPTH)


with BuildPart() as body_9:
    # Sketch1 → Boss-Extrude1 9 (new body)
    with BuildSketch(Plane(origin=(0, 0, 0), x_dir=(1, 0, 0), z_dir=(0, 1, 0))):
        with Locations((10, 70)):
            Circle(SKETCH1_R)
        with Locations((10, 70)):
            Circle(SKETCH1_R_2, mode=Mode.SUBTRACT)
    extrude(amount=BOSS_EXTRUDE1_9_DEPTH)


with BuildPart() as body_10:
    # Sketch1 → Boss-Extrude1 10 (new body)
    with BuildSketch(Plane(origin=(0, 0, 0), x_dir=(1, 0, 0), z_dir=(0, 1, 0))):
        with Locations((30, 70)):
            Circle(SKETCH1_R)
        with Locations((30, 70)):
            Circle(SKETCH1_R_2, mode=Mode.SUBTRACT)
    extrude(amount=BOSS_EXTRUDE1_10_DEPTH)


with BuildPart() as body_11:
    # Sketch1 → Boss-Extrude1 11 (new body)
    with BuildSketch(Plane(origin=(0, 0, 0), x_dir=(1, 0, 0), z_dir=(0, 1, 0))):
        with Locations((-30, 50)):
            Circle(SKETCH1_R)
        with Locations((-30, 50)):
            Circle(SKETCH1_R_2, mode=Mode.SUBTRACT)
    extrude(amount=BOSS_EXTRUDE1_11_DEPTH)


with BuildPart() as body_12:
    # Sketch1 → Boss-Extrude1 12 (new body)
    with BuildSketch(Plane(origin=(0, 0, 0), x_dir=(1, 0, 0), z_dir=(0, 1, 0))):
        with Locations((-30, 70)):
            Circle(SKETCH1_R)
        with Locations((-30, 70)):
            Circle(SKETCH1_R_2, mode=Mode.SUBTRACT)
    extrude(amount=BOSS_EXTRUDE1_12_DEPTH)


solid = Compound([part.part, body_2.part, body_3.part, body_4.part, body_5.part, body_6.part, body_7.part, body_8.part, body_9.part, body_10.part, body_11.part, body_12.part])
